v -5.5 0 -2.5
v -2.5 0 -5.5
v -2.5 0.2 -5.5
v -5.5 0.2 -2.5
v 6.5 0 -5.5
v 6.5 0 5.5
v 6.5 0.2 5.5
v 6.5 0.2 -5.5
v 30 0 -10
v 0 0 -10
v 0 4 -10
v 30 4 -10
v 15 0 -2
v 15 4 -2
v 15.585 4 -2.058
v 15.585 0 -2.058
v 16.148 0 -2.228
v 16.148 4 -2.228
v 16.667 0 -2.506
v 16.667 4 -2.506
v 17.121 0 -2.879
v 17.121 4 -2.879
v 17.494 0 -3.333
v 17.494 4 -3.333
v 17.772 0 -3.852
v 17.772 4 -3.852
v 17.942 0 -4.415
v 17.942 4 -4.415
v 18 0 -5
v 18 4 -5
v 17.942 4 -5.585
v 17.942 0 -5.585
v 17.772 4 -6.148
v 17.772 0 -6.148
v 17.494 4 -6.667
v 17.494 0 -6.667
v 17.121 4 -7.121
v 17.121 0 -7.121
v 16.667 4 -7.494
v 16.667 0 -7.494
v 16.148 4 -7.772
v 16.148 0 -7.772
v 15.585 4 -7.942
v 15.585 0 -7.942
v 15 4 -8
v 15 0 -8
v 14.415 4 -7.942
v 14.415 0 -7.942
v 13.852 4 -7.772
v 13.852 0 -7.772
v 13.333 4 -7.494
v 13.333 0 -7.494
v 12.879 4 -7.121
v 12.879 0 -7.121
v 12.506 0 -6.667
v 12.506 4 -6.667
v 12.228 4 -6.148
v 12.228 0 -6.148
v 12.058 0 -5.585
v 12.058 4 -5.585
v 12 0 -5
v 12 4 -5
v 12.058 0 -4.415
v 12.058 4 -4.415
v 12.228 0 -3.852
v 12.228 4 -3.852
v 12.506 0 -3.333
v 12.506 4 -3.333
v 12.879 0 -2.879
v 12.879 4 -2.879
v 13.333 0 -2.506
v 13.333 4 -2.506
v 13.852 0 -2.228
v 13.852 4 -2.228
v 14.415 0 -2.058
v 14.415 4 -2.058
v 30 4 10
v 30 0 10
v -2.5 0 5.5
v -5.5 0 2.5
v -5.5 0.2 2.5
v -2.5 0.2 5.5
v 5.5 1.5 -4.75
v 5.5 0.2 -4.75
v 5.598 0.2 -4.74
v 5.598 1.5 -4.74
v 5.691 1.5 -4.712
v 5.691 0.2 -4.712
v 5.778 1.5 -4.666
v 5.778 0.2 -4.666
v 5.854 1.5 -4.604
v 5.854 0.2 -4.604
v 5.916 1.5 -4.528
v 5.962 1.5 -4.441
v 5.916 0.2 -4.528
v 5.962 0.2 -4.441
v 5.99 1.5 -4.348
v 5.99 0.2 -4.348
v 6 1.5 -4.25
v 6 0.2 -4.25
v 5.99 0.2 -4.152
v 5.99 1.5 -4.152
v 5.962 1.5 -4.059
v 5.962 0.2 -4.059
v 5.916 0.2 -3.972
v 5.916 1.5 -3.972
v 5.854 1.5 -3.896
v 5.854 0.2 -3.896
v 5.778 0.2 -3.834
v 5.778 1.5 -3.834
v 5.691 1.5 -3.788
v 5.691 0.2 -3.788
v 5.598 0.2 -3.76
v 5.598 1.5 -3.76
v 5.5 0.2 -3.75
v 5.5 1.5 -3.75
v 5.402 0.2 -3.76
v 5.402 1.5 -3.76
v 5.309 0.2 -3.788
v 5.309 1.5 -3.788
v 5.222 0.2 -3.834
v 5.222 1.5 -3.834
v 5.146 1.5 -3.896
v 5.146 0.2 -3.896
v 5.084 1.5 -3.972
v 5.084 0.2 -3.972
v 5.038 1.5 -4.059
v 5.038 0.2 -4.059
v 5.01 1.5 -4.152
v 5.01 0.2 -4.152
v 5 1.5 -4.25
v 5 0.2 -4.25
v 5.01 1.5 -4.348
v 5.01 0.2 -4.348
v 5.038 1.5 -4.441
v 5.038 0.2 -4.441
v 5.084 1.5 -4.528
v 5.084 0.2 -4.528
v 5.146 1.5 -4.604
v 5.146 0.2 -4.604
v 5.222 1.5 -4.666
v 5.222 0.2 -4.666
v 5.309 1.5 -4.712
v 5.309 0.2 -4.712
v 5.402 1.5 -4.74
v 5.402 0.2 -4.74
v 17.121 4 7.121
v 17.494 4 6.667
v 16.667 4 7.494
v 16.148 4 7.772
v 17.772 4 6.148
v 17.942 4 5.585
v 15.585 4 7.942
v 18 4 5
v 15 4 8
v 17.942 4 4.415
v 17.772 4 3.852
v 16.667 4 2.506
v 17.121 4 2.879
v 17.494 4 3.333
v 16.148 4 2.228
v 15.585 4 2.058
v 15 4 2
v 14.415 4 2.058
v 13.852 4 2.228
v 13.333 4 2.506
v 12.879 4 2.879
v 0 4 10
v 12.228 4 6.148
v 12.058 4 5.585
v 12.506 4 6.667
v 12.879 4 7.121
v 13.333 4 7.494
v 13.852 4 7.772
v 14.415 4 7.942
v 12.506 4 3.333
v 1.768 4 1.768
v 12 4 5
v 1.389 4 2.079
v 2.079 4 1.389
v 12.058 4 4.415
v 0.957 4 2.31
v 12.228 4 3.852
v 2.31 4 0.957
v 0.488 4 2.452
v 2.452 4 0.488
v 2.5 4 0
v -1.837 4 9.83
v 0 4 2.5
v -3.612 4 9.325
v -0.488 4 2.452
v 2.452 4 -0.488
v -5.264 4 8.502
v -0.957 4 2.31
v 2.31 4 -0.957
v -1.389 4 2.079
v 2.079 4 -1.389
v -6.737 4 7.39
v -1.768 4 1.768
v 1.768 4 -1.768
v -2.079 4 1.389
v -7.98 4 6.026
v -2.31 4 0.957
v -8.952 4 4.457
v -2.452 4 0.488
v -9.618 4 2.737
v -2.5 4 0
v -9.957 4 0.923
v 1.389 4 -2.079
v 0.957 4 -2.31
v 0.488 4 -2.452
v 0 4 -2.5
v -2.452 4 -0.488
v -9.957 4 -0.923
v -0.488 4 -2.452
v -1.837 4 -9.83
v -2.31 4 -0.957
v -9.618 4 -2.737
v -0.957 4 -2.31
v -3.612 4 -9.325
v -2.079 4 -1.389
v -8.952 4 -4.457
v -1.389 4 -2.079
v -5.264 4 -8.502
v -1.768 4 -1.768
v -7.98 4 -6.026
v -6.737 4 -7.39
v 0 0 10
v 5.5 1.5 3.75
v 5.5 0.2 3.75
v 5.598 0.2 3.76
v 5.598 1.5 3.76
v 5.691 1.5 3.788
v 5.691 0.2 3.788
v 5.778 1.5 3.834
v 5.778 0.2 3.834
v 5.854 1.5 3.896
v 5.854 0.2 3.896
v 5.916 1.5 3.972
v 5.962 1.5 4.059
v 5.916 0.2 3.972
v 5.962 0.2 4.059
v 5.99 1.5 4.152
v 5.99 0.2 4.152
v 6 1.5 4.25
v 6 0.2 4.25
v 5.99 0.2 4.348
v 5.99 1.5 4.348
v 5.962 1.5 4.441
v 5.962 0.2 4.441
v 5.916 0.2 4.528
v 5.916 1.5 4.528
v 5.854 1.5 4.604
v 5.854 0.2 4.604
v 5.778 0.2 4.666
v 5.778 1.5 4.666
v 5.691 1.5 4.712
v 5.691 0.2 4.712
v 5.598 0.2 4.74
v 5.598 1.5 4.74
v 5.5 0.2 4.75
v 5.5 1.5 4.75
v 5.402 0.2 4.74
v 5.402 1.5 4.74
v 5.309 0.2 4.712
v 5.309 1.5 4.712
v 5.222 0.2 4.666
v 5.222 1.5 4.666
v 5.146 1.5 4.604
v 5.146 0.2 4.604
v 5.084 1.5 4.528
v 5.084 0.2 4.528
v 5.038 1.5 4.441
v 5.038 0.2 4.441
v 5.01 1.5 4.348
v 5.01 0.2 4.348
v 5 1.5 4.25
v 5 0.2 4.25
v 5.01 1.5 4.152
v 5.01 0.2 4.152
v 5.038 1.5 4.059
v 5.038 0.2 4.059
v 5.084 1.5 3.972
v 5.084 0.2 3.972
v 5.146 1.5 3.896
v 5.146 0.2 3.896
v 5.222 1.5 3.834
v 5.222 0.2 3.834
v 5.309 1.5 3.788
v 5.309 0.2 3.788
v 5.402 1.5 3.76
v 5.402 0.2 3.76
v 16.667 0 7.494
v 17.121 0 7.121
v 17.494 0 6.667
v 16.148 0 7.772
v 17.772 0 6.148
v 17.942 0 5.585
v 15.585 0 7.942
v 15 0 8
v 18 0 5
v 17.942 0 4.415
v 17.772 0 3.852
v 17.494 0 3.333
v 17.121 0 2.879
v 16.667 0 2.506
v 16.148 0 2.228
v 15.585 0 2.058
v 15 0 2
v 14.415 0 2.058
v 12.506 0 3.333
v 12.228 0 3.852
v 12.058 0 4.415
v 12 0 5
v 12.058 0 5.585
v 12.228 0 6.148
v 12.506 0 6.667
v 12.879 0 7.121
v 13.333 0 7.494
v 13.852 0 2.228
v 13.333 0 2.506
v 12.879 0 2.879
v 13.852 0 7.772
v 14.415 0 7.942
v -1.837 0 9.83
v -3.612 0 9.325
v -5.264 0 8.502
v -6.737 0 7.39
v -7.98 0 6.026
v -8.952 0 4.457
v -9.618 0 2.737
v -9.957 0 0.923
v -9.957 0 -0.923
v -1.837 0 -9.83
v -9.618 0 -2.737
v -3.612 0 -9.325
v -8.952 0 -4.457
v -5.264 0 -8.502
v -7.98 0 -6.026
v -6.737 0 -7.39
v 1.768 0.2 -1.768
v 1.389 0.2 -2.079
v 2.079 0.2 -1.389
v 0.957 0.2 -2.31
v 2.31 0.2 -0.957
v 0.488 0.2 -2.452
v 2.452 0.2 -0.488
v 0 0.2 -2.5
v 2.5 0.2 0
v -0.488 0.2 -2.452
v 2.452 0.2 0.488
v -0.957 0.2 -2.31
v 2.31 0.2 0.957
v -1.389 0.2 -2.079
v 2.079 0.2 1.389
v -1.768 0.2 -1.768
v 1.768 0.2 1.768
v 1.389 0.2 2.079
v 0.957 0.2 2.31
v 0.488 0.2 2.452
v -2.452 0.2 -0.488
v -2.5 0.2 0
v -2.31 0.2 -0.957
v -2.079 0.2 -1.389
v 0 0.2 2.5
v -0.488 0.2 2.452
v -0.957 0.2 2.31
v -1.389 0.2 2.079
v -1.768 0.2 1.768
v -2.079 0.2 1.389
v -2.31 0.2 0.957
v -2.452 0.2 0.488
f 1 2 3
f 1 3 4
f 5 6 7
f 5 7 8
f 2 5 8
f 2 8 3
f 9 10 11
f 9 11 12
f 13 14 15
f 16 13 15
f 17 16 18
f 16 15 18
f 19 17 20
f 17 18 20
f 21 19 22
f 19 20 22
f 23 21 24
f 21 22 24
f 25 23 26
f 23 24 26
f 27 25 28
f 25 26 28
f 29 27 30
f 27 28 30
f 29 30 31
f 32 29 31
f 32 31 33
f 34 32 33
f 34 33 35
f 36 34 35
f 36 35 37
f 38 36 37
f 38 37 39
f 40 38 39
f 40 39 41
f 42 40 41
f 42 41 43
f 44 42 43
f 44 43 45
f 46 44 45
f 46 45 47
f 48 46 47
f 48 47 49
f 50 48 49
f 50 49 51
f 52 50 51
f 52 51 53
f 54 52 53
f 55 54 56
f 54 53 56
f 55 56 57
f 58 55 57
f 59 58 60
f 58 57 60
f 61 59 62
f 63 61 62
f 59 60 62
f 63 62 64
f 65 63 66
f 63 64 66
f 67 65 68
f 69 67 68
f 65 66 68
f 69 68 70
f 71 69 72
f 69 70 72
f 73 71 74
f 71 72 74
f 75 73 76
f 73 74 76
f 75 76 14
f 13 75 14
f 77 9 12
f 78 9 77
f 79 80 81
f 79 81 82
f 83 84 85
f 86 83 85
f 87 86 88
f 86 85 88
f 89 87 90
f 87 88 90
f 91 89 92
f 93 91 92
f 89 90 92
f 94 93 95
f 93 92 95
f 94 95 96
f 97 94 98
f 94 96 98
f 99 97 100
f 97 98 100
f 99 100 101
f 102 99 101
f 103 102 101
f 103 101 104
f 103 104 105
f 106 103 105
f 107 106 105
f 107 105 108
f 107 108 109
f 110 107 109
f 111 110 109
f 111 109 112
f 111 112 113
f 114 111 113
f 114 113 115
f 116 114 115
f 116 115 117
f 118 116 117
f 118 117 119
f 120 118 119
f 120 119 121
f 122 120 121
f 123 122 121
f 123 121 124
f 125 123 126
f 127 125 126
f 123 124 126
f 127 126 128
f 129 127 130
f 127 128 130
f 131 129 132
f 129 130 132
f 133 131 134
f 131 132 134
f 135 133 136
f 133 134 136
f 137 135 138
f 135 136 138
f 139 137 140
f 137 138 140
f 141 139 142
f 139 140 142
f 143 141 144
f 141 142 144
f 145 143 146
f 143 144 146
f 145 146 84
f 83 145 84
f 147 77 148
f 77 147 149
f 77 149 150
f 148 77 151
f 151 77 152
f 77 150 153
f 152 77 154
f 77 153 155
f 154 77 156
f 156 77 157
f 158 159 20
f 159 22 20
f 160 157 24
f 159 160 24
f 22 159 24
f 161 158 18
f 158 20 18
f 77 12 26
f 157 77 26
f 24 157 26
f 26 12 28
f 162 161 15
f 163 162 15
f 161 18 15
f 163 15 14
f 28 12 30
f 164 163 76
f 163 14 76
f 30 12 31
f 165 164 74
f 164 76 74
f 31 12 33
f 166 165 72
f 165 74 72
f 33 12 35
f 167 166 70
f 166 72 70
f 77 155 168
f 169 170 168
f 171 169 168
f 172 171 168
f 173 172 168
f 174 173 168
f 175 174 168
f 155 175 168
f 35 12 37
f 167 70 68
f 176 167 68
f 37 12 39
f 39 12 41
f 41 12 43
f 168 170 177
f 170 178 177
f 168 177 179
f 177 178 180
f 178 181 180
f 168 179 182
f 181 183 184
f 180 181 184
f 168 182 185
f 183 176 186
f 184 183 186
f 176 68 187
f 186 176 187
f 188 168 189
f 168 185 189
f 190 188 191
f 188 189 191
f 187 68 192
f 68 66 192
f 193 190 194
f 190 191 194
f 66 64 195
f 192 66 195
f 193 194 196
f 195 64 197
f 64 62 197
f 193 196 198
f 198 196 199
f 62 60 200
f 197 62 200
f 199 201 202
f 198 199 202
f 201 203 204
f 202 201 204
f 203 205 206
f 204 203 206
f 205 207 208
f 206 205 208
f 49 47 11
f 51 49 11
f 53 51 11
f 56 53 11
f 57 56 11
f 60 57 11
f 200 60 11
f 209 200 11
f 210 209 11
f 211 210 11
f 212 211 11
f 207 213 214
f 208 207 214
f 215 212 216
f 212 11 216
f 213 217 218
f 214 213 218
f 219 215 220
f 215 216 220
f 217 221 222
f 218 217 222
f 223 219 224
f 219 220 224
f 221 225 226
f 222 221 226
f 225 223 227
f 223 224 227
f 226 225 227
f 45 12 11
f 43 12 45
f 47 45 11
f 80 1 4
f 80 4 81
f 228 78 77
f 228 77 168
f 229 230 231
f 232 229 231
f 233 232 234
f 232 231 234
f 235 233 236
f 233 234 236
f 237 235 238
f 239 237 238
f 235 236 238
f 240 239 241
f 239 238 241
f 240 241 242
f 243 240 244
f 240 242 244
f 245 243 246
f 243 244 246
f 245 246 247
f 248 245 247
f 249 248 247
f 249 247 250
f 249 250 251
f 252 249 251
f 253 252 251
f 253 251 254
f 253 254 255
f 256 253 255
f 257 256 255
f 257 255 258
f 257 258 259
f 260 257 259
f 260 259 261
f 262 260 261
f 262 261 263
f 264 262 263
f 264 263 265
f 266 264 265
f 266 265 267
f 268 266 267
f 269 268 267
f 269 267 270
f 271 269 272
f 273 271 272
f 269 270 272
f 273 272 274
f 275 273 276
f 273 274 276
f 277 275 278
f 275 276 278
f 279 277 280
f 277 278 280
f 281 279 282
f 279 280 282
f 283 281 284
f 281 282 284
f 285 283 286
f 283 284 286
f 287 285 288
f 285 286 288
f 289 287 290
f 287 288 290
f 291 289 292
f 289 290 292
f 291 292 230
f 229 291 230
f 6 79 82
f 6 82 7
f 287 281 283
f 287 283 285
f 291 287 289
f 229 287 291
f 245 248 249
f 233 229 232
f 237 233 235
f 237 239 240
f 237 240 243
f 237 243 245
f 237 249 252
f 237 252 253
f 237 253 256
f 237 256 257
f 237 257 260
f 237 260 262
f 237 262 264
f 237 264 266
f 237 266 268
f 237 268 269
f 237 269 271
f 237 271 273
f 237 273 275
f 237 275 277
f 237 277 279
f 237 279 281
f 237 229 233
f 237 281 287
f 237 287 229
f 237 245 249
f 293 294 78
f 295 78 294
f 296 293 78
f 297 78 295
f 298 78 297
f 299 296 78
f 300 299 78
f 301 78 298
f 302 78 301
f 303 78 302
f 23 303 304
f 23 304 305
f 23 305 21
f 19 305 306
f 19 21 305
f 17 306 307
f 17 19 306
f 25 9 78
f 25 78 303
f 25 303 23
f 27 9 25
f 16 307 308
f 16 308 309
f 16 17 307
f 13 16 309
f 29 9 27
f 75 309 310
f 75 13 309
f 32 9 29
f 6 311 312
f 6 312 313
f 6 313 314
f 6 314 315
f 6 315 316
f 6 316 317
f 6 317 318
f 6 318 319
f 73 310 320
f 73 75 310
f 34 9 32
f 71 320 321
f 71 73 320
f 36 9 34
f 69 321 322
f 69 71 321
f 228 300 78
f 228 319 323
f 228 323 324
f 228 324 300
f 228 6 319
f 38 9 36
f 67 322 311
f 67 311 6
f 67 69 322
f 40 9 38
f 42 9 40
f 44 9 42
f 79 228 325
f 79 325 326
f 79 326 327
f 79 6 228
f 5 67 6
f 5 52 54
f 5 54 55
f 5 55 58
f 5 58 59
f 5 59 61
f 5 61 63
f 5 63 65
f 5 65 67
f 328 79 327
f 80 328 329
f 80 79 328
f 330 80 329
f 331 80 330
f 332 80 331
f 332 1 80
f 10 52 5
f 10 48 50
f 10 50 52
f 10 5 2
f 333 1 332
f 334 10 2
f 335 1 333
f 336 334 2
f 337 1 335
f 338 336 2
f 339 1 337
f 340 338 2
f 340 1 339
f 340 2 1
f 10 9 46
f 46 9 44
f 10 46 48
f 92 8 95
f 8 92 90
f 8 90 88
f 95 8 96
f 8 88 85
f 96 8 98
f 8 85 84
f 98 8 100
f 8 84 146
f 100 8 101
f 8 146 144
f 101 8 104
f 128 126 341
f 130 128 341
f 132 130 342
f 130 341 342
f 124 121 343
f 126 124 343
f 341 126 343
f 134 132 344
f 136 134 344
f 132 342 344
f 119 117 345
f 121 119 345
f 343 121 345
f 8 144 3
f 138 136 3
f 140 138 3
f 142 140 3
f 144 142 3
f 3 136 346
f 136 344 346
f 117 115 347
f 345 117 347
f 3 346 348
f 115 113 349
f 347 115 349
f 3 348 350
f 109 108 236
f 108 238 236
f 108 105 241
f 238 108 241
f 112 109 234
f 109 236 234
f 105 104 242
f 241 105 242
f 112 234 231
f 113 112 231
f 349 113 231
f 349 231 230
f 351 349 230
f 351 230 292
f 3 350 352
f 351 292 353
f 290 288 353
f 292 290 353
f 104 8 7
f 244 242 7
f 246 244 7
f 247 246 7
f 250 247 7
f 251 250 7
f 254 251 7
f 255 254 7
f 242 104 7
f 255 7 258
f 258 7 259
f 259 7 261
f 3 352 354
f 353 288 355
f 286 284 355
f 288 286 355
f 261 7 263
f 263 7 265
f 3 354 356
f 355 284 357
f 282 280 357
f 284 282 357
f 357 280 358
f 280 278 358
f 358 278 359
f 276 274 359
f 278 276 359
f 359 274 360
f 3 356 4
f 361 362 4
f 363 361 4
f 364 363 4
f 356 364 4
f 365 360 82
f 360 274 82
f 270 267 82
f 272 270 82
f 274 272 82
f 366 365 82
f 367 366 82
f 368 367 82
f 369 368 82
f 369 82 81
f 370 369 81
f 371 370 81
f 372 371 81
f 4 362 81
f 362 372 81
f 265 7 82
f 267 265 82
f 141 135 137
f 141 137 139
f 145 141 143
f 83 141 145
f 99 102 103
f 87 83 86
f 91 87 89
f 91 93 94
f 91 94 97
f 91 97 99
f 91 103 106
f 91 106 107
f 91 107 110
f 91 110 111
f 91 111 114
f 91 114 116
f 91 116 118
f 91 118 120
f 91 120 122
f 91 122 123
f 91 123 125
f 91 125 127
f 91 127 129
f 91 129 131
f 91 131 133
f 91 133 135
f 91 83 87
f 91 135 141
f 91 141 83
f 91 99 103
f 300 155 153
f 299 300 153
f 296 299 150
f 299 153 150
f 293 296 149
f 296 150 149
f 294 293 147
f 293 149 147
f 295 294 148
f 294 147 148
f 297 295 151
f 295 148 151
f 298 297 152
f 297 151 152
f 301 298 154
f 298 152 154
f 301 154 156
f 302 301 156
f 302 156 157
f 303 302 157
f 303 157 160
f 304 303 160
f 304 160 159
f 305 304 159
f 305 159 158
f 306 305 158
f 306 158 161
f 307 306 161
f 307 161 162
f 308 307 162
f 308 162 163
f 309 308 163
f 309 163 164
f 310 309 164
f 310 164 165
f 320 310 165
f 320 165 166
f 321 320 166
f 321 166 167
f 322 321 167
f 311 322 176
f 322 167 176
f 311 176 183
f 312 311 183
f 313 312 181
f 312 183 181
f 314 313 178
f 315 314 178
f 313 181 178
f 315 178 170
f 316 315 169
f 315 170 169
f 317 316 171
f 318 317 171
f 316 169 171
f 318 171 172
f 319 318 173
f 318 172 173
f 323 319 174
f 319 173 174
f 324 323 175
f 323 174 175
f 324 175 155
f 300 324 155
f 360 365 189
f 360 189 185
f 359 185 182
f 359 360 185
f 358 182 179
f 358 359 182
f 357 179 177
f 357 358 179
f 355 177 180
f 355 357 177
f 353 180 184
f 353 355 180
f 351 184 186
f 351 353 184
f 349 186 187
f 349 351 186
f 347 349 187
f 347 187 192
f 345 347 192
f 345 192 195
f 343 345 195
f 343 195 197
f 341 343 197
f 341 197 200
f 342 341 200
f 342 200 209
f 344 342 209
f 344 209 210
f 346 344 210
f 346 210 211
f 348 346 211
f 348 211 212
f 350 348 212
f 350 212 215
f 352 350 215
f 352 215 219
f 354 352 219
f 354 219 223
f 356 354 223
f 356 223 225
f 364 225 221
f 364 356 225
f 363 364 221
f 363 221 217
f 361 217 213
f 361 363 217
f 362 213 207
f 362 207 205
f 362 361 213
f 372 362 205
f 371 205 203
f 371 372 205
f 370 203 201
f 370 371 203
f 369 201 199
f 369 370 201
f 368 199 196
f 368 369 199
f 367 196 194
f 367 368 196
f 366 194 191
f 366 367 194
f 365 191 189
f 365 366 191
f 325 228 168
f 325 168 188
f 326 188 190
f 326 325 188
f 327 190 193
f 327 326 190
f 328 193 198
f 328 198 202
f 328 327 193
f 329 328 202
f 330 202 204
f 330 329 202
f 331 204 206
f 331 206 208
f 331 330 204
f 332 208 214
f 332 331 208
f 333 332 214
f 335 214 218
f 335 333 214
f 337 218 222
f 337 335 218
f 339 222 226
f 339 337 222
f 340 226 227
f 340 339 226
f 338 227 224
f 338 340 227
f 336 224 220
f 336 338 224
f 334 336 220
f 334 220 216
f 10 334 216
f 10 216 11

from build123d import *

# Parameters (mm, degrees)
SKETCH1_R           = 2.5
BOSS_EXTRUDE1_DEPTH = 4
CUT_EXTRUDE2_DEPTH  = 0.2
SKETCH6_R           = 0.5
CUT_EXTRUDE3_DEPTH  = 1.5
SKETCH7_R           = 3
CUT_EXTRUDE4_DEPTH  = 32.874754901


with BuildPart() as part:
    # Sketch1 → Boss-Extrude1 (new body)
    with BuildSketch(Plane(origin=(0, 0, 0), x_dir=(1, 0, 0), z_dir=(0, 1, 0))):
        with BuildLine():
            Line((10, 10), (30, 10))
            Line((30, 10), (30, -10))
            Line((30, -10), (10, -10))
            Line((10, -10), (0, -10))
            ThreePointArc((0, -10), (-10, 0), (0, 10))
            Line((0, 10), (10, 10))
        make_face()
        with Locations(Location((0, 0, 0), (0, 0, 270))):
            Circle(SKETCH1_R, mode=Mode.SUBTRACT)
    extrude(amount=BOSS_EXTRUDE1_DEPTH)

    # Sketch5 → Cut-Extrude2 (cut)
    with BuildSketch(Plane.XZ):
        Polygon((-5.5, -2.5), (-5.5, 2.5), (-2.5, 5.5), (6.5, 5.5), (6.5, -5.5), (-2.5, -5.5), align=None)
    extrude(amount=-CUT_EXTRUDE2_DEPTH, mode=Mode.SUBTRACT)

    # Sketch6 → Cut-Extrude3 (cut)
    with BuildSketch(Plane.XZ):
        with Locations(Location((5.5, 4.25, 0), (0, 0, 270))):
            Circle(SKETCH6_R)
        with Locations(Location((5.5, -4.25, 0), (0, 0, 270))):
            Circle(SKETCH6_R)
    extrude(amount=-CUT_EXTRUDE3_DEPTH, mode=Mode.SUBTRACT)

    # Sketch7 → Cut-Extrude4 (cut, through all)
    with BuildSketch(Plane(origin=(0, 4, 0), x_dir=(1, 0, 0), z_dir=(0, 1, 0))):
        with Locations(Location((15, 5, 0), (0, 0, 270))):
            Circle(SKETCH7_R)
        with Locations(Location((15, -5, 0), (0, 0, 270))):
            Circle(SKETCH7_R)
    extrude(amount=-CUT_EXTRUDE4_DEPTH, mode=Mode.SUBTRACT)


solid = part.part
